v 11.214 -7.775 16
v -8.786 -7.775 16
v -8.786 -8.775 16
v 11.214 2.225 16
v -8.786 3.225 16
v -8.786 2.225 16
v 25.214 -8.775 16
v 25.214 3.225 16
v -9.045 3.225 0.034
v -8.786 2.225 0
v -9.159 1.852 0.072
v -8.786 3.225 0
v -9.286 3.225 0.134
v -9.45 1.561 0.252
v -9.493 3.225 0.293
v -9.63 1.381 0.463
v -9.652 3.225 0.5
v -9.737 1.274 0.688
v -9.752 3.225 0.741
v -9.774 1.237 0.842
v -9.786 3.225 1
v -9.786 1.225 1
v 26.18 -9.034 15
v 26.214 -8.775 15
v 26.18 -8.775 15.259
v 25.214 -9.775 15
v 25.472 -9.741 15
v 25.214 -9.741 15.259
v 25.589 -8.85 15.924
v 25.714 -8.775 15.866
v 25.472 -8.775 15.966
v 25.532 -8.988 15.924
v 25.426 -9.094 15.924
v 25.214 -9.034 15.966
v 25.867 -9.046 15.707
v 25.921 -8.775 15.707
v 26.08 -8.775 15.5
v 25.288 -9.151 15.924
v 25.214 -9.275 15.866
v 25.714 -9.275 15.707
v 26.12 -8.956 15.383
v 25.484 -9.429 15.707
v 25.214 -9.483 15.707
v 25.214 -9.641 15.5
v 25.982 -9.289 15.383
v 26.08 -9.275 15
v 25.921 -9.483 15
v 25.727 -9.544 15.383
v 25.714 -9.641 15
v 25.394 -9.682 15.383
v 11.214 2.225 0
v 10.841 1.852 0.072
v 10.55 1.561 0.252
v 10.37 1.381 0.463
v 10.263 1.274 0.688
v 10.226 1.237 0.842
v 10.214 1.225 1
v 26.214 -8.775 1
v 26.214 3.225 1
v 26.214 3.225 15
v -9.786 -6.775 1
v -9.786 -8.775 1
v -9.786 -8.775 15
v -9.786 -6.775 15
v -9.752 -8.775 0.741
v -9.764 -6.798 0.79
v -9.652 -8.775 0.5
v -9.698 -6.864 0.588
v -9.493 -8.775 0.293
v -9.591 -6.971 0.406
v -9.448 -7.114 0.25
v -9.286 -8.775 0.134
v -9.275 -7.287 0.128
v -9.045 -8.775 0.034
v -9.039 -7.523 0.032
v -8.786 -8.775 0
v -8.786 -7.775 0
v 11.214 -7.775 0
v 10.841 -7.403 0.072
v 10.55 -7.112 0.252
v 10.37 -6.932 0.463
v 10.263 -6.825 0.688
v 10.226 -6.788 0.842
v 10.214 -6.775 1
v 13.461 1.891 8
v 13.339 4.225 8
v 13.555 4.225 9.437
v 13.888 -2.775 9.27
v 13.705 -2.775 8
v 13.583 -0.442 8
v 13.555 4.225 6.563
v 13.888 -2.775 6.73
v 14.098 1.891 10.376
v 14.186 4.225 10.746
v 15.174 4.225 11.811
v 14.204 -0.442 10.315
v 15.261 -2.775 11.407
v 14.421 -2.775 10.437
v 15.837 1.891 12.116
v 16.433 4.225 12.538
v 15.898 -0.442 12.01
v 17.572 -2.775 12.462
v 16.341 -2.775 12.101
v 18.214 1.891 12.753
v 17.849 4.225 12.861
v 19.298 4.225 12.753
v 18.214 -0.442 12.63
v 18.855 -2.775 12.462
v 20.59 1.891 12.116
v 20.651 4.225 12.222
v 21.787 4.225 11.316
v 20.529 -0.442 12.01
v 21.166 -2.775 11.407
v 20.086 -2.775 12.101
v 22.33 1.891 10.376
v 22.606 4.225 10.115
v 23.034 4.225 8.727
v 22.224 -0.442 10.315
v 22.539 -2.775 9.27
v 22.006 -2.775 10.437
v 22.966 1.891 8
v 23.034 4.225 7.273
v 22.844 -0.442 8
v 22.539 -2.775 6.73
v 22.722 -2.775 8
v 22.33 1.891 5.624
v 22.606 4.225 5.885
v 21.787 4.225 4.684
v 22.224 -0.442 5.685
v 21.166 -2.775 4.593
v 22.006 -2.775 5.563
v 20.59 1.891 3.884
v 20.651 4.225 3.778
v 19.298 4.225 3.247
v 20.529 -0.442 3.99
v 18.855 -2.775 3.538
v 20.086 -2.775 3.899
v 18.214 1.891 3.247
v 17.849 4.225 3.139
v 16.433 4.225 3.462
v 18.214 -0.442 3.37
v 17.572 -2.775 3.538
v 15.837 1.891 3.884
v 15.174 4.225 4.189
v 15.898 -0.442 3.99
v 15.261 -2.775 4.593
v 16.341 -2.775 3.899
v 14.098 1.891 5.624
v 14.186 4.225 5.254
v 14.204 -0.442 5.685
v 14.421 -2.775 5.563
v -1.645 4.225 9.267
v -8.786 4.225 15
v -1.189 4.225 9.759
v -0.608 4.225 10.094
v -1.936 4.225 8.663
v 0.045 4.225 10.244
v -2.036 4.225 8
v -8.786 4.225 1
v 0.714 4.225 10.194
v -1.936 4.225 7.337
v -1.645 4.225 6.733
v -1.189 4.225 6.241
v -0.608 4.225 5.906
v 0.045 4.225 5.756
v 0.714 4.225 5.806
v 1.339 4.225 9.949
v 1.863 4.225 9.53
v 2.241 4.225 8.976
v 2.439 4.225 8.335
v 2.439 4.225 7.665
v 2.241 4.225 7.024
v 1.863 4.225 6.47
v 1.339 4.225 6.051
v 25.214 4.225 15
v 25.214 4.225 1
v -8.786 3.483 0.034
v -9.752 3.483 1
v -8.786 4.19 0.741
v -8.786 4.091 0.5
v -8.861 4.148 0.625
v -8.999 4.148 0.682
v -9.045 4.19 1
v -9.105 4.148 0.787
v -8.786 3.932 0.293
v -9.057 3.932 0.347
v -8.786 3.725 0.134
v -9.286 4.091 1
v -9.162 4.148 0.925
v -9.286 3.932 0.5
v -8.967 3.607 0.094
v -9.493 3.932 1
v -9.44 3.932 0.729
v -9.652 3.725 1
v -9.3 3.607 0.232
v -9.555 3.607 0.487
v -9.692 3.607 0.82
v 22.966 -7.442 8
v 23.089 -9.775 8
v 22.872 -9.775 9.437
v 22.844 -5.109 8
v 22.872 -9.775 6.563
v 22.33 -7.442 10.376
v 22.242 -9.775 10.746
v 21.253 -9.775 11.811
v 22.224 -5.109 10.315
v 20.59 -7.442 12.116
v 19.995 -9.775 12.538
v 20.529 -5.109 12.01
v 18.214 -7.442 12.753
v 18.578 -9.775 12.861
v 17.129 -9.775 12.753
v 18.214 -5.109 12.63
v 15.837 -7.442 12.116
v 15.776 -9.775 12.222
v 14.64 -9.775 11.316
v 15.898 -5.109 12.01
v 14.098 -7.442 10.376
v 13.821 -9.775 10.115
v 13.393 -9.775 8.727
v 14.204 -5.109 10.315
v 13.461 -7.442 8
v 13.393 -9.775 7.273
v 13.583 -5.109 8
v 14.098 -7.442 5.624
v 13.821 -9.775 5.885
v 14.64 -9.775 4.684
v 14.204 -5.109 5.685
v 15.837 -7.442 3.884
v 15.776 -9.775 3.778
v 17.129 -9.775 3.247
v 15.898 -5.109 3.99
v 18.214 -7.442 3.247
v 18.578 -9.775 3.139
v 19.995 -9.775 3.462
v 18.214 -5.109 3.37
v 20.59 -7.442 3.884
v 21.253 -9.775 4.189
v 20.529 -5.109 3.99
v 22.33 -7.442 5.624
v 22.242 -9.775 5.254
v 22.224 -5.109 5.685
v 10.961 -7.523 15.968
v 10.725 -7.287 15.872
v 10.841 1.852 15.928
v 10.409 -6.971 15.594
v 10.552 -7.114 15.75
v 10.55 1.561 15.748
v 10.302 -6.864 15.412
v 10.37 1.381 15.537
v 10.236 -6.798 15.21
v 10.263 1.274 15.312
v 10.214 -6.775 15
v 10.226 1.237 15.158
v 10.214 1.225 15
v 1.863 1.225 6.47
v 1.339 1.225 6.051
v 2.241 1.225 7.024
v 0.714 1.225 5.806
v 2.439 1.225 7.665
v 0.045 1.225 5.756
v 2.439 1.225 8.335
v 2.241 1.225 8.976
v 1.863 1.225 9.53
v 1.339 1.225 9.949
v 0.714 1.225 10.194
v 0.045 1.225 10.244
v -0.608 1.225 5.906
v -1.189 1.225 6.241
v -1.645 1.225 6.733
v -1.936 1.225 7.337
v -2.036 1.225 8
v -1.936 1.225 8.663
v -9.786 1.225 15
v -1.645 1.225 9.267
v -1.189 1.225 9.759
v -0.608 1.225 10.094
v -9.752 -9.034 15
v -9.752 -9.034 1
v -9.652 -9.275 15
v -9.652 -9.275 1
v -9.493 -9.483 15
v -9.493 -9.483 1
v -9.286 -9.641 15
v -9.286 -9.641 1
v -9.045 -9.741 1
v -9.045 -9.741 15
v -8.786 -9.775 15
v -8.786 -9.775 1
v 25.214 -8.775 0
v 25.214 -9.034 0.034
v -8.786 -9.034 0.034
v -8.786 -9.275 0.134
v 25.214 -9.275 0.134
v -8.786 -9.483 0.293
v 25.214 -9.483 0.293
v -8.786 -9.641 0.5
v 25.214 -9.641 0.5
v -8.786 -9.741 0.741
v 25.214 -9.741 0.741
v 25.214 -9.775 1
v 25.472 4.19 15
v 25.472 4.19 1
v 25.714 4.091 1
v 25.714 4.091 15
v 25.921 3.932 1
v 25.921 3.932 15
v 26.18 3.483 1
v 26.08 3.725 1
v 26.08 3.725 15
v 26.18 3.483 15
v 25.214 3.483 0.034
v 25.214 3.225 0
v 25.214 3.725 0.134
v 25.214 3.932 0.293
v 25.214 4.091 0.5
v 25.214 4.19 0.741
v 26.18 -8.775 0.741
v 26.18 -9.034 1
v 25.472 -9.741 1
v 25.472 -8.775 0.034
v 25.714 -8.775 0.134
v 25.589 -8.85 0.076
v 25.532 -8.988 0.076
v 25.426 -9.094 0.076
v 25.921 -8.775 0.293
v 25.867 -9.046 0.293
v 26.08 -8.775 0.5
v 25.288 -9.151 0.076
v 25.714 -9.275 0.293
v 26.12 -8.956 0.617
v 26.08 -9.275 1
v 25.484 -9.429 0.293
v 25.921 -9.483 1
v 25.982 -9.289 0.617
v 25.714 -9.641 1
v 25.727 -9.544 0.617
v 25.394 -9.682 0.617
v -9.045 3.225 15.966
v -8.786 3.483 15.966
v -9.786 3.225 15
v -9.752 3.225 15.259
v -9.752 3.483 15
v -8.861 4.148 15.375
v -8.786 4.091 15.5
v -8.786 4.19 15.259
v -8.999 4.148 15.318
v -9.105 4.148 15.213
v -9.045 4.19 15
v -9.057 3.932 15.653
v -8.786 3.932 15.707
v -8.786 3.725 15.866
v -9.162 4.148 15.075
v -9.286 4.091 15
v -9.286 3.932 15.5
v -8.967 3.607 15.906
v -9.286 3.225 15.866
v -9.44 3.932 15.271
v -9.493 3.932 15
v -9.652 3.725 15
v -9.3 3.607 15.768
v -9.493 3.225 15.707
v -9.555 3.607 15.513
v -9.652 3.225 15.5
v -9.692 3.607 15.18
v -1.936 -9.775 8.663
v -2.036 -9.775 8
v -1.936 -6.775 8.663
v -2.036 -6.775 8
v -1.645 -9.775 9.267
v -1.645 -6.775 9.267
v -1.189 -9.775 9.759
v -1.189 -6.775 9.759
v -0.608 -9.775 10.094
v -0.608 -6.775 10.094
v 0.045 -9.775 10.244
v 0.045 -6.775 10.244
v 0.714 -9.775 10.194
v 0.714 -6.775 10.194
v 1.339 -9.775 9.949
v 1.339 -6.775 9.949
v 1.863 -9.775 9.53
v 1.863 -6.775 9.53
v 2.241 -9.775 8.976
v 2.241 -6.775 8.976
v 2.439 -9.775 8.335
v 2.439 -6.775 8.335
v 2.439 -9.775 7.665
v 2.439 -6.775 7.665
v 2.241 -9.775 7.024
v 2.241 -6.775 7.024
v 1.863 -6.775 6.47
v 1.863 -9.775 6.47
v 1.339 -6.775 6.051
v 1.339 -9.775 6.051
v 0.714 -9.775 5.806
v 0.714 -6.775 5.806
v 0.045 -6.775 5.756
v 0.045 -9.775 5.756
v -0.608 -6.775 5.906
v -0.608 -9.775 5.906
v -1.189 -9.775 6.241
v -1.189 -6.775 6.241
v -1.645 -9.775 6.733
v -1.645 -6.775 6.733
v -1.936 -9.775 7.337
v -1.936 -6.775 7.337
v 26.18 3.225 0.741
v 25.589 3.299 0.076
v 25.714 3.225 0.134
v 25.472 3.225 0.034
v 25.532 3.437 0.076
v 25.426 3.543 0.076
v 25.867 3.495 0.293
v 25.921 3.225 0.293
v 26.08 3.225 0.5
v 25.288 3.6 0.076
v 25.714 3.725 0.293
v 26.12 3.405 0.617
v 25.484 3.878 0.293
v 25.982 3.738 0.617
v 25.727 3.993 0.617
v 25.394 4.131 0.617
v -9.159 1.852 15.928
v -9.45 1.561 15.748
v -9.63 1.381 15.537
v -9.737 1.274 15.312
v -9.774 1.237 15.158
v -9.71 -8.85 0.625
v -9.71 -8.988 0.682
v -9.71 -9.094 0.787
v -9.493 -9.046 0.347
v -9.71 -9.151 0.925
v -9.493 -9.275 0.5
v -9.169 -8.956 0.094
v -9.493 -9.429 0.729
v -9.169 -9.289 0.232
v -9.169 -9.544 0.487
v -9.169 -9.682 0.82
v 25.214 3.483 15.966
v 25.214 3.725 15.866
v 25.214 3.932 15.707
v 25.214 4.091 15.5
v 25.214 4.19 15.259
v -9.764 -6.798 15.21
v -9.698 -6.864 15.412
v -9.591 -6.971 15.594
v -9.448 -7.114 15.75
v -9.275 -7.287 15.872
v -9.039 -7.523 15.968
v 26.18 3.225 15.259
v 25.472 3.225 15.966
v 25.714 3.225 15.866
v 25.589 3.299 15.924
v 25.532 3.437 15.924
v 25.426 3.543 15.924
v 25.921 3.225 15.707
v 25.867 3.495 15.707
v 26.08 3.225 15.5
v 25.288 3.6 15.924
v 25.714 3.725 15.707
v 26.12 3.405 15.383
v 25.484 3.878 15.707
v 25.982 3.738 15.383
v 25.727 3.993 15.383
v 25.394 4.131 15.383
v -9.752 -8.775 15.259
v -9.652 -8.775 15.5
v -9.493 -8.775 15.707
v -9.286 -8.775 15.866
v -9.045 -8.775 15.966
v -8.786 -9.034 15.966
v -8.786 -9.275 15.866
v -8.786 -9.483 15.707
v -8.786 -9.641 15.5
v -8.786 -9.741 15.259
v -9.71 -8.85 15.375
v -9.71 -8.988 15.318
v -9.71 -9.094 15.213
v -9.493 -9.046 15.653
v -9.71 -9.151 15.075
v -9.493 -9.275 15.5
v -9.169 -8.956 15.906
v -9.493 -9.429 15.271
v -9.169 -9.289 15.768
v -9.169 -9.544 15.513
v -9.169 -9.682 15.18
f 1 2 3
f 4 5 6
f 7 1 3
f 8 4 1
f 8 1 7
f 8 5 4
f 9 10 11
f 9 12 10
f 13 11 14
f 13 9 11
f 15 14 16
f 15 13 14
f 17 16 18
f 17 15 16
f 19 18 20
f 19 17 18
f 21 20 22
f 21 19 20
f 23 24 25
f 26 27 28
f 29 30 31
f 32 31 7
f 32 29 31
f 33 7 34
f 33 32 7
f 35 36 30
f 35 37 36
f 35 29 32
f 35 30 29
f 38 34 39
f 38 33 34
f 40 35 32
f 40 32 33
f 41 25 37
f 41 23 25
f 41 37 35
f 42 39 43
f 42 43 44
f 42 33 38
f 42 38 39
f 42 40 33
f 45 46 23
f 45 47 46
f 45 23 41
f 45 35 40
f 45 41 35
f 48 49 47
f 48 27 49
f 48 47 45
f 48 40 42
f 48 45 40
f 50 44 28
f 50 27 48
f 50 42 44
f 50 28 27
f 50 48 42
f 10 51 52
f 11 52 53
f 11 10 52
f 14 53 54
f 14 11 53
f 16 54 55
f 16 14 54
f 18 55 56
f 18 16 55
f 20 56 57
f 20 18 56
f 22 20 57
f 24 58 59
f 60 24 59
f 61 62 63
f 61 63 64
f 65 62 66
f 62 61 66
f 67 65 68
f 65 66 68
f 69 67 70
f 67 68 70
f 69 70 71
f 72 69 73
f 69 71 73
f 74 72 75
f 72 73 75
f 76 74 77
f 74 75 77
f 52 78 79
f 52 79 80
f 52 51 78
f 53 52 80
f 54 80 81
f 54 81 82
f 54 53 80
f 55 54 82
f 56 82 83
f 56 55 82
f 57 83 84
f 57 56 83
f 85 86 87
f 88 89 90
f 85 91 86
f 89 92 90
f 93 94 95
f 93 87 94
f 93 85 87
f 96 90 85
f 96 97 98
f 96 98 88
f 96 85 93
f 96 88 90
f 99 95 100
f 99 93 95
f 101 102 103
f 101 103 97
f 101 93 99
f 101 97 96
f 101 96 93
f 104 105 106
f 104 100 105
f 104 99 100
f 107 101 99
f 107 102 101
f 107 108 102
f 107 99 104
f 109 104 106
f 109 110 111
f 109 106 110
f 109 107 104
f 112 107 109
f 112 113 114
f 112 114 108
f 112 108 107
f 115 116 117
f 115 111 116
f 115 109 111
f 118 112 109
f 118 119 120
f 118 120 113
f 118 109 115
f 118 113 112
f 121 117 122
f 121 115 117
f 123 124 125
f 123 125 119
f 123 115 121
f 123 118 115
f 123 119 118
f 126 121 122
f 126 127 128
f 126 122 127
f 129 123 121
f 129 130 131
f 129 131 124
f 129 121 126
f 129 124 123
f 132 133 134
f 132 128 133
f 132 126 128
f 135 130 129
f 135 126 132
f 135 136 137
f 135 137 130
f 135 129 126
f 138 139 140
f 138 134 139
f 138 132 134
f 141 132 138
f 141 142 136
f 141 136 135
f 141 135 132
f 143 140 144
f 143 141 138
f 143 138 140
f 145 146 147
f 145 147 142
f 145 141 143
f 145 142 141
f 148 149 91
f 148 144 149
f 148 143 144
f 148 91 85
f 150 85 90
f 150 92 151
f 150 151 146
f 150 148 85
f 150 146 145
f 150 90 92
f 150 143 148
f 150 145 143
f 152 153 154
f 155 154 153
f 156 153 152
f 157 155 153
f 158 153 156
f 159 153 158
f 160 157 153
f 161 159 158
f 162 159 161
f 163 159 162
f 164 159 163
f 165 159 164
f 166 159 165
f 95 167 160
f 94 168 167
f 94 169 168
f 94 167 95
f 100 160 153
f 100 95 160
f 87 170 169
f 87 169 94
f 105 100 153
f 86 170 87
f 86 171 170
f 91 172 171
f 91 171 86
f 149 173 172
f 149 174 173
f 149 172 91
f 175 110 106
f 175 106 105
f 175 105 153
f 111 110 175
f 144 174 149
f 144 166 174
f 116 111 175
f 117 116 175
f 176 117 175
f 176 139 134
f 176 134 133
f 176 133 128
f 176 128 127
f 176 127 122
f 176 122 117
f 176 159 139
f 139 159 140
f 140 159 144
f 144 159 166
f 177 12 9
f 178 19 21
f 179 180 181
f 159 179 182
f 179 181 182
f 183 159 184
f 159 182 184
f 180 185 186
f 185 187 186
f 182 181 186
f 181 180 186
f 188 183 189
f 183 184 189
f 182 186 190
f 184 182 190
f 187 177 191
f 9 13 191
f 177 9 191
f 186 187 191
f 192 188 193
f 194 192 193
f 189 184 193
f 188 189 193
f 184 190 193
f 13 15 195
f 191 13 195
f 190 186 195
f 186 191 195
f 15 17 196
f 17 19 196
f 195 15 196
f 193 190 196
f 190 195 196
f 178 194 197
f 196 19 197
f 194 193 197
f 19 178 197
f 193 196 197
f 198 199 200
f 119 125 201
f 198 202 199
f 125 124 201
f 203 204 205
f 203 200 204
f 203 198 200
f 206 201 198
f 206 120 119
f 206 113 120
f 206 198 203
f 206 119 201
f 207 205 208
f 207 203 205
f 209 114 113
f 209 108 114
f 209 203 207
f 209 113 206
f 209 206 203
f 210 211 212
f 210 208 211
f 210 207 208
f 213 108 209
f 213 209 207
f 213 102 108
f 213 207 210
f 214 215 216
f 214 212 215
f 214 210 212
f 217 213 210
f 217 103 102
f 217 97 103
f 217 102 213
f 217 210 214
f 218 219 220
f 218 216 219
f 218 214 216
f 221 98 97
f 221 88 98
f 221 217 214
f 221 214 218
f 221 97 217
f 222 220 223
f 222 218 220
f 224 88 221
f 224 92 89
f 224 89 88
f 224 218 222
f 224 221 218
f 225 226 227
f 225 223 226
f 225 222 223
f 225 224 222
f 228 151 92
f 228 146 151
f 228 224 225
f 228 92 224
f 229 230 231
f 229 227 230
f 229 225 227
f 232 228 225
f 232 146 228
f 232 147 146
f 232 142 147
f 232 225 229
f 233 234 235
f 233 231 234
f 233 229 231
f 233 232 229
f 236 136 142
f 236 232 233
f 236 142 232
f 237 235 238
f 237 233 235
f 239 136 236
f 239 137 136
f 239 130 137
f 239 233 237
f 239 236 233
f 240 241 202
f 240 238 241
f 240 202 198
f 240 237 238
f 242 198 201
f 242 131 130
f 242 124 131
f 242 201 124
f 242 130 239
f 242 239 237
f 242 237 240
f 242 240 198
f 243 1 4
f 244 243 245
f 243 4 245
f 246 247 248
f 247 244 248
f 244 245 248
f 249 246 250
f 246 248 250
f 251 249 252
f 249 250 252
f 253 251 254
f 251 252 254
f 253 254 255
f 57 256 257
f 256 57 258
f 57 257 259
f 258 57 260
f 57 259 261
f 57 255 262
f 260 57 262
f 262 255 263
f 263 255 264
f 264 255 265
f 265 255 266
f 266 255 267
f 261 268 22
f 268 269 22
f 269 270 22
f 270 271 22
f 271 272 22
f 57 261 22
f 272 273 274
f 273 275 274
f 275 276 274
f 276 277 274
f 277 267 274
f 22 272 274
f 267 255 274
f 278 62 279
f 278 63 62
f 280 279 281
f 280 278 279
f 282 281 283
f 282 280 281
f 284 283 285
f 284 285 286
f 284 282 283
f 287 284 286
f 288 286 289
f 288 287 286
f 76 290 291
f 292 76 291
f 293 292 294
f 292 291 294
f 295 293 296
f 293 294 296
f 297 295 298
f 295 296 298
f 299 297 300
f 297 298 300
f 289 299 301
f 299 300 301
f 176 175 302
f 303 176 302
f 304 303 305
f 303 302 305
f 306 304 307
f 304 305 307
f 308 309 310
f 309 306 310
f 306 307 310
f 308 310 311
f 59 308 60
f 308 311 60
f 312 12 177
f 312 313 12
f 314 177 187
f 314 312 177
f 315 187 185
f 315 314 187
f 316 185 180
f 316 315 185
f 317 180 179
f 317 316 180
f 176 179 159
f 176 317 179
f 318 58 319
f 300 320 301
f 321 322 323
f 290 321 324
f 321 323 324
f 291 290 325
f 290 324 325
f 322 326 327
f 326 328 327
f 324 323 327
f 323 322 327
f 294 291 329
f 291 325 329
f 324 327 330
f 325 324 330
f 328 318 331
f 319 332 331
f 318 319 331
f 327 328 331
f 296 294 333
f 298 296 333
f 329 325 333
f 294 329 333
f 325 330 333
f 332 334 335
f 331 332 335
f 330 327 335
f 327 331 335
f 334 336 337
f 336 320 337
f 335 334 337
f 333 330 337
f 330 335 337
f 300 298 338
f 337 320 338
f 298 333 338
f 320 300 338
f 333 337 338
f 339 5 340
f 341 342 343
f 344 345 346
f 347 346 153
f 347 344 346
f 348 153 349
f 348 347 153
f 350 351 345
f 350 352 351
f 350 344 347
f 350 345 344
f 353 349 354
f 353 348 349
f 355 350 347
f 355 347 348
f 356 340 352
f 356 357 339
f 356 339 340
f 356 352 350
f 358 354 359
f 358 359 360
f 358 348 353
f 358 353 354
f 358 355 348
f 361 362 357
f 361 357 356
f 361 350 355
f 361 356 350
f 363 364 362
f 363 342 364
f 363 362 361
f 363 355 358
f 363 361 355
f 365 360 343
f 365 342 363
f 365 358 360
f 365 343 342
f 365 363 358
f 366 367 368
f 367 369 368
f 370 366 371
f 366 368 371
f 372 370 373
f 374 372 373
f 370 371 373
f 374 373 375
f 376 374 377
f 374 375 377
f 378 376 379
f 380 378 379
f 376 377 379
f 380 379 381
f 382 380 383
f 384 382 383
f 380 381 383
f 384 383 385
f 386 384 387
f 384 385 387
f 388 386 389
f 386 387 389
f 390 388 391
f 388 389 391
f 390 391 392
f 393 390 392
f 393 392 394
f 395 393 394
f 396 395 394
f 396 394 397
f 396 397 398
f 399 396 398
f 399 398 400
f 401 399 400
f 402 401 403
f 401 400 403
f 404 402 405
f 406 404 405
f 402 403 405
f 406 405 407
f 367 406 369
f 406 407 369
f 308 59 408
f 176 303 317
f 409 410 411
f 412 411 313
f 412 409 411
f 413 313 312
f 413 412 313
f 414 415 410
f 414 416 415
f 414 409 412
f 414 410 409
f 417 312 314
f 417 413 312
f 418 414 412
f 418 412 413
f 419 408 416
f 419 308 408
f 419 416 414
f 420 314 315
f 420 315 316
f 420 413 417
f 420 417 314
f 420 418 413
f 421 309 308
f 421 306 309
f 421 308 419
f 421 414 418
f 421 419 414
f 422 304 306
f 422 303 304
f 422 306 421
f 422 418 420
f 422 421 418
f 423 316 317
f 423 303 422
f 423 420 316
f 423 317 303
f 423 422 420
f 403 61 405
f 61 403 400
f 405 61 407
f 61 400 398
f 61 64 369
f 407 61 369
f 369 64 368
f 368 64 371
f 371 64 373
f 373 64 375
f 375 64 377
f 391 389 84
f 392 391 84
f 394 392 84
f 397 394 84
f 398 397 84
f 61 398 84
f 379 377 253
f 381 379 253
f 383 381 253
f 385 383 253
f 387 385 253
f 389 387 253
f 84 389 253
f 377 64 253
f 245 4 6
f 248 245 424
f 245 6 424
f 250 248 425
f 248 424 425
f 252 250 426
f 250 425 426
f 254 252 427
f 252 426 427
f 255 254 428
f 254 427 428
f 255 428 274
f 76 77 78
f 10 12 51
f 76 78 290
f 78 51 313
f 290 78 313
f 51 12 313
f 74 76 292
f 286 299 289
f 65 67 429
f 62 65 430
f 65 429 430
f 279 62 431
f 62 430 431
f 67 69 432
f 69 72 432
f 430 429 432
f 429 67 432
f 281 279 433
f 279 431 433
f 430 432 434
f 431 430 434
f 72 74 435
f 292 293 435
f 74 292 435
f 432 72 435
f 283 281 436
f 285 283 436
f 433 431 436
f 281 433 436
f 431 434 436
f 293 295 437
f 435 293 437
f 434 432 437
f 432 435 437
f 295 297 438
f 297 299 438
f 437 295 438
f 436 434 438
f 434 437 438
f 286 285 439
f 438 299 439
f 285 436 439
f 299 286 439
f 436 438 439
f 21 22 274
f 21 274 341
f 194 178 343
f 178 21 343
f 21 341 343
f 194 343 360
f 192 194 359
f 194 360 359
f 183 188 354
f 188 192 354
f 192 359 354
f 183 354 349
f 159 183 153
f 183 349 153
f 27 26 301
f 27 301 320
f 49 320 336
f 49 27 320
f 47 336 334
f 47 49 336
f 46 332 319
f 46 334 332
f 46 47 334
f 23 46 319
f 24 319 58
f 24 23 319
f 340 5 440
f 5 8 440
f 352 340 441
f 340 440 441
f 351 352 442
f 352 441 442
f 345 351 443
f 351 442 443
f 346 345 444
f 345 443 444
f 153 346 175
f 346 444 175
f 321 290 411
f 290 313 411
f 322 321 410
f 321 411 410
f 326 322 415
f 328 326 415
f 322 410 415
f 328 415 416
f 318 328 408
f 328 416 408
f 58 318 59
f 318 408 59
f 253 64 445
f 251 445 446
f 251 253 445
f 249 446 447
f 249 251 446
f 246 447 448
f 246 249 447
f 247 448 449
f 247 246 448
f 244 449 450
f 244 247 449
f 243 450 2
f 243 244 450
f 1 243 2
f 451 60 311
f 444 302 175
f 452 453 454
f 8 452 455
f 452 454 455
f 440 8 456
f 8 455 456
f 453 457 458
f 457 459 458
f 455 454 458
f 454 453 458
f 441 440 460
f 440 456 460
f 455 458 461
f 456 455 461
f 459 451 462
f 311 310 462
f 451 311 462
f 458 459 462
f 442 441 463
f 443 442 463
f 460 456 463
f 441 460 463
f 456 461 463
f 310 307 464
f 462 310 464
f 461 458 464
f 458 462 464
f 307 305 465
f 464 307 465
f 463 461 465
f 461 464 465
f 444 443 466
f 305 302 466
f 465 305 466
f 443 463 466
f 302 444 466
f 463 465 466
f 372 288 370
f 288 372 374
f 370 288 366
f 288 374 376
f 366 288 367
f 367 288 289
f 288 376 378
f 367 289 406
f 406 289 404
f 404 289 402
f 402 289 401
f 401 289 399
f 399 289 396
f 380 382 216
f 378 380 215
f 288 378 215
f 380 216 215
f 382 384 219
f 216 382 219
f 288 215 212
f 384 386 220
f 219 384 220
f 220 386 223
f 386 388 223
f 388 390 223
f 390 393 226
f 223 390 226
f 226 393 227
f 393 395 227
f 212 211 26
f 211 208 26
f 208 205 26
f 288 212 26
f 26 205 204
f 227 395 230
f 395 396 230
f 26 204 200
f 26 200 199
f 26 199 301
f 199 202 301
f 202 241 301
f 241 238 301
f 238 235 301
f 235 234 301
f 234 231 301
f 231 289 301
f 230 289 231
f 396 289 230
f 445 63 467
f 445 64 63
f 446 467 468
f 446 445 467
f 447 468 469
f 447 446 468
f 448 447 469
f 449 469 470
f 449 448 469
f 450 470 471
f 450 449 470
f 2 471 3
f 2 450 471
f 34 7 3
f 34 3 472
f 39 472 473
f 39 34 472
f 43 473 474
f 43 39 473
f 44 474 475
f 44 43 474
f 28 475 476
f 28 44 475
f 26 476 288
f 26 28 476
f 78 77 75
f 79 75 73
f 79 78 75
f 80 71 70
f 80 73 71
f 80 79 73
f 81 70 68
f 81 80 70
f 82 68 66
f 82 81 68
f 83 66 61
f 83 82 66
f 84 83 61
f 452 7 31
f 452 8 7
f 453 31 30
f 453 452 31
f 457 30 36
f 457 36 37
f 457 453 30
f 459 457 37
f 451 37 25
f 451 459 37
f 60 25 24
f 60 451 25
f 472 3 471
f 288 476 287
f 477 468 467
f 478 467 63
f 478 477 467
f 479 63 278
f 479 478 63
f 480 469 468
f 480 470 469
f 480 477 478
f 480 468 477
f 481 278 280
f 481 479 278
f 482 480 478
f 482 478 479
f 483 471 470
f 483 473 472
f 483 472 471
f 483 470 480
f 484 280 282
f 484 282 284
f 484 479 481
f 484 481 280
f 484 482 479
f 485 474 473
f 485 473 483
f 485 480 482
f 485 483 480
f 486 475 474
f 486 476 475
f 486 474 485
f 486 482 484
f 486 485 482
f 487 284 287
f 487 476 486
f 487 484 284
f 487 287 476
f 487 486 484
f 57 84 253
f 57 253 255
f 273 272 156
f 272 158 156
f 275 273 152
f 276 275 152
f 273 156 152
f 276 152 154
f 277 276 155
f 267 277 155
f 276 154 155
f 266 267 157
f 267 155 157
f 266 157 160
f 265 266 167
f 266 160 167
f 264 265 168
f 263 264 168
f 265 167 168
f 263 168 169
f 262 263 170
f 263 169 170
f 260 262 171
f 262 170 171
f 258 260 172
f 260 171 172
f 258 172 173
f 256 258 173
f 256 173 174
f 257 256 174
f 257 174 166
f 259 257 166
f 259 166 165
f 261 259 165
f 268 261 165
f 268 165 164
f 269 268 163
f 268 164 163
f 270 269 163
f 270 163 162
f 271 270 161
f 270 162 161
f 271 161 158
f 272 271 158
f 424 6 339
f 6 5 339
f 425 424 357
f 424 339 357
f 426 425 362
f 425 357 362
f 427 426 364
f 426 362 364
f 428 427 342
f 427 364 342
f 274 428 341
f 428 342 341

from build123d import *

# Parameters (mm, degrees)
F0_W     = 36
F0_H     = 14
F1_DEPTH = 16
F2_W     = 20
F2_H     = 8
F2_W_2   = 30.9440002977
F3_DEPTH = 29.3
F4_R     = 4.875
F5_DEPTH = 11
F5_TAPER = 3
F6_R     = 4.875
F7_DEPTH = 11
F7_TAPER = 3
F8_R     = 1
F4_R_2   = 2.25
F9_DEPTH = 16


with BuildPart() as f1:
    # F0 (on Top) → F1 (new body)
    with BuildSketch(Plane.XY):
        with Locations((8.2136405466, -2.7754378021)):
            Rectangle(F0_W, F0_H)
    extrude(amount=F1_DEPTH)

    # F2 (on face) → F3 (cut, symmetric)
    with BuildSketch(Plane.XY.offset(16)):
        with Locations((0.2136405466, -2.7754378021)):
            Rectangle(F2_W, F2_H)
        with Locations((-25.2583596023, -2.7754378021)):
            Rectangle(F2_W_2, F2_H)
    extrude(amount=F3_DEPTH, both=True, mode=Mode.SUBTRACT)

    # F4 (on face) → F5 (cut)
    with BuildSketch(Plane(origin=(0, 4.2245621979, 0), x_dir=(-1, 0, 0), z_dir=(0, 1, 0))):
        with Locations((-18.2136405466, 8)):
            Circle(F4_R)
    extrude(amount=-F5_DEPTH, taper=F5_TAPER, mode=Mode.SUBTRACT)

    # F6 (on face) → F7 (cut)
    with BuildSketch(Plane.XZ.offset(9.7754378021)):
        with Locations((18.2136405466, 8)):
            Circle(F6_R)
    extrude(amount=-F7_DEPTH, taper=F7_TAPER, mode=Mode.SUBTRACT)

    # F8
    f8_edges = [f1.edges().sort_by_distance(p)[0] for p in [
        (26.213641, -9.775438, 8),
        (26.213641, 4.224562, 8),
        (26.213641, -2.775438, 0),
        (26.213641, -2.775438, 16),
        (8.213641, -9.775438, 16),
        (-9.786359, -8.275438, 16),
        (0.213641, -6.775438, 16),
        (10.213641, -2.775438, 16),
        (0.213641, 1.224562, 16),
        (-9.786359, 2.724562, 16),
        (8.213641, 4.224562, 16),
        (8.213641, -9.775438, 0),
        (-9.786359, -8.275438, 0),
        (0.213641, -6.775438, 0),
        (10.213641, -2.775438, 0),
        (0.213641, 1.224562, 0),
        (-9.786359, 2.724562, 0),
        (8.213641, 4.224562, 0),
        (-9.786359, 4.224562, 8),
        (-9.786359, -9.775438, 8),
    ]]
    fillet(f8_edges, radius=F8_R)

    # F4 (on face) → F9 (cut, symmetric)
    with BuildSketch(Plane(origin=(0, 4.2245621979, 0), x_dir=(-1, 0, 0), z_dir=(0, 1, 0))):
        with Locations((-0.2136405466, 8)):
            Circle(F4_R_2)
    extrude(amount=F9_DEPTH, both=True, mode=Mode.SUBTRACT)


solid = f1.part
